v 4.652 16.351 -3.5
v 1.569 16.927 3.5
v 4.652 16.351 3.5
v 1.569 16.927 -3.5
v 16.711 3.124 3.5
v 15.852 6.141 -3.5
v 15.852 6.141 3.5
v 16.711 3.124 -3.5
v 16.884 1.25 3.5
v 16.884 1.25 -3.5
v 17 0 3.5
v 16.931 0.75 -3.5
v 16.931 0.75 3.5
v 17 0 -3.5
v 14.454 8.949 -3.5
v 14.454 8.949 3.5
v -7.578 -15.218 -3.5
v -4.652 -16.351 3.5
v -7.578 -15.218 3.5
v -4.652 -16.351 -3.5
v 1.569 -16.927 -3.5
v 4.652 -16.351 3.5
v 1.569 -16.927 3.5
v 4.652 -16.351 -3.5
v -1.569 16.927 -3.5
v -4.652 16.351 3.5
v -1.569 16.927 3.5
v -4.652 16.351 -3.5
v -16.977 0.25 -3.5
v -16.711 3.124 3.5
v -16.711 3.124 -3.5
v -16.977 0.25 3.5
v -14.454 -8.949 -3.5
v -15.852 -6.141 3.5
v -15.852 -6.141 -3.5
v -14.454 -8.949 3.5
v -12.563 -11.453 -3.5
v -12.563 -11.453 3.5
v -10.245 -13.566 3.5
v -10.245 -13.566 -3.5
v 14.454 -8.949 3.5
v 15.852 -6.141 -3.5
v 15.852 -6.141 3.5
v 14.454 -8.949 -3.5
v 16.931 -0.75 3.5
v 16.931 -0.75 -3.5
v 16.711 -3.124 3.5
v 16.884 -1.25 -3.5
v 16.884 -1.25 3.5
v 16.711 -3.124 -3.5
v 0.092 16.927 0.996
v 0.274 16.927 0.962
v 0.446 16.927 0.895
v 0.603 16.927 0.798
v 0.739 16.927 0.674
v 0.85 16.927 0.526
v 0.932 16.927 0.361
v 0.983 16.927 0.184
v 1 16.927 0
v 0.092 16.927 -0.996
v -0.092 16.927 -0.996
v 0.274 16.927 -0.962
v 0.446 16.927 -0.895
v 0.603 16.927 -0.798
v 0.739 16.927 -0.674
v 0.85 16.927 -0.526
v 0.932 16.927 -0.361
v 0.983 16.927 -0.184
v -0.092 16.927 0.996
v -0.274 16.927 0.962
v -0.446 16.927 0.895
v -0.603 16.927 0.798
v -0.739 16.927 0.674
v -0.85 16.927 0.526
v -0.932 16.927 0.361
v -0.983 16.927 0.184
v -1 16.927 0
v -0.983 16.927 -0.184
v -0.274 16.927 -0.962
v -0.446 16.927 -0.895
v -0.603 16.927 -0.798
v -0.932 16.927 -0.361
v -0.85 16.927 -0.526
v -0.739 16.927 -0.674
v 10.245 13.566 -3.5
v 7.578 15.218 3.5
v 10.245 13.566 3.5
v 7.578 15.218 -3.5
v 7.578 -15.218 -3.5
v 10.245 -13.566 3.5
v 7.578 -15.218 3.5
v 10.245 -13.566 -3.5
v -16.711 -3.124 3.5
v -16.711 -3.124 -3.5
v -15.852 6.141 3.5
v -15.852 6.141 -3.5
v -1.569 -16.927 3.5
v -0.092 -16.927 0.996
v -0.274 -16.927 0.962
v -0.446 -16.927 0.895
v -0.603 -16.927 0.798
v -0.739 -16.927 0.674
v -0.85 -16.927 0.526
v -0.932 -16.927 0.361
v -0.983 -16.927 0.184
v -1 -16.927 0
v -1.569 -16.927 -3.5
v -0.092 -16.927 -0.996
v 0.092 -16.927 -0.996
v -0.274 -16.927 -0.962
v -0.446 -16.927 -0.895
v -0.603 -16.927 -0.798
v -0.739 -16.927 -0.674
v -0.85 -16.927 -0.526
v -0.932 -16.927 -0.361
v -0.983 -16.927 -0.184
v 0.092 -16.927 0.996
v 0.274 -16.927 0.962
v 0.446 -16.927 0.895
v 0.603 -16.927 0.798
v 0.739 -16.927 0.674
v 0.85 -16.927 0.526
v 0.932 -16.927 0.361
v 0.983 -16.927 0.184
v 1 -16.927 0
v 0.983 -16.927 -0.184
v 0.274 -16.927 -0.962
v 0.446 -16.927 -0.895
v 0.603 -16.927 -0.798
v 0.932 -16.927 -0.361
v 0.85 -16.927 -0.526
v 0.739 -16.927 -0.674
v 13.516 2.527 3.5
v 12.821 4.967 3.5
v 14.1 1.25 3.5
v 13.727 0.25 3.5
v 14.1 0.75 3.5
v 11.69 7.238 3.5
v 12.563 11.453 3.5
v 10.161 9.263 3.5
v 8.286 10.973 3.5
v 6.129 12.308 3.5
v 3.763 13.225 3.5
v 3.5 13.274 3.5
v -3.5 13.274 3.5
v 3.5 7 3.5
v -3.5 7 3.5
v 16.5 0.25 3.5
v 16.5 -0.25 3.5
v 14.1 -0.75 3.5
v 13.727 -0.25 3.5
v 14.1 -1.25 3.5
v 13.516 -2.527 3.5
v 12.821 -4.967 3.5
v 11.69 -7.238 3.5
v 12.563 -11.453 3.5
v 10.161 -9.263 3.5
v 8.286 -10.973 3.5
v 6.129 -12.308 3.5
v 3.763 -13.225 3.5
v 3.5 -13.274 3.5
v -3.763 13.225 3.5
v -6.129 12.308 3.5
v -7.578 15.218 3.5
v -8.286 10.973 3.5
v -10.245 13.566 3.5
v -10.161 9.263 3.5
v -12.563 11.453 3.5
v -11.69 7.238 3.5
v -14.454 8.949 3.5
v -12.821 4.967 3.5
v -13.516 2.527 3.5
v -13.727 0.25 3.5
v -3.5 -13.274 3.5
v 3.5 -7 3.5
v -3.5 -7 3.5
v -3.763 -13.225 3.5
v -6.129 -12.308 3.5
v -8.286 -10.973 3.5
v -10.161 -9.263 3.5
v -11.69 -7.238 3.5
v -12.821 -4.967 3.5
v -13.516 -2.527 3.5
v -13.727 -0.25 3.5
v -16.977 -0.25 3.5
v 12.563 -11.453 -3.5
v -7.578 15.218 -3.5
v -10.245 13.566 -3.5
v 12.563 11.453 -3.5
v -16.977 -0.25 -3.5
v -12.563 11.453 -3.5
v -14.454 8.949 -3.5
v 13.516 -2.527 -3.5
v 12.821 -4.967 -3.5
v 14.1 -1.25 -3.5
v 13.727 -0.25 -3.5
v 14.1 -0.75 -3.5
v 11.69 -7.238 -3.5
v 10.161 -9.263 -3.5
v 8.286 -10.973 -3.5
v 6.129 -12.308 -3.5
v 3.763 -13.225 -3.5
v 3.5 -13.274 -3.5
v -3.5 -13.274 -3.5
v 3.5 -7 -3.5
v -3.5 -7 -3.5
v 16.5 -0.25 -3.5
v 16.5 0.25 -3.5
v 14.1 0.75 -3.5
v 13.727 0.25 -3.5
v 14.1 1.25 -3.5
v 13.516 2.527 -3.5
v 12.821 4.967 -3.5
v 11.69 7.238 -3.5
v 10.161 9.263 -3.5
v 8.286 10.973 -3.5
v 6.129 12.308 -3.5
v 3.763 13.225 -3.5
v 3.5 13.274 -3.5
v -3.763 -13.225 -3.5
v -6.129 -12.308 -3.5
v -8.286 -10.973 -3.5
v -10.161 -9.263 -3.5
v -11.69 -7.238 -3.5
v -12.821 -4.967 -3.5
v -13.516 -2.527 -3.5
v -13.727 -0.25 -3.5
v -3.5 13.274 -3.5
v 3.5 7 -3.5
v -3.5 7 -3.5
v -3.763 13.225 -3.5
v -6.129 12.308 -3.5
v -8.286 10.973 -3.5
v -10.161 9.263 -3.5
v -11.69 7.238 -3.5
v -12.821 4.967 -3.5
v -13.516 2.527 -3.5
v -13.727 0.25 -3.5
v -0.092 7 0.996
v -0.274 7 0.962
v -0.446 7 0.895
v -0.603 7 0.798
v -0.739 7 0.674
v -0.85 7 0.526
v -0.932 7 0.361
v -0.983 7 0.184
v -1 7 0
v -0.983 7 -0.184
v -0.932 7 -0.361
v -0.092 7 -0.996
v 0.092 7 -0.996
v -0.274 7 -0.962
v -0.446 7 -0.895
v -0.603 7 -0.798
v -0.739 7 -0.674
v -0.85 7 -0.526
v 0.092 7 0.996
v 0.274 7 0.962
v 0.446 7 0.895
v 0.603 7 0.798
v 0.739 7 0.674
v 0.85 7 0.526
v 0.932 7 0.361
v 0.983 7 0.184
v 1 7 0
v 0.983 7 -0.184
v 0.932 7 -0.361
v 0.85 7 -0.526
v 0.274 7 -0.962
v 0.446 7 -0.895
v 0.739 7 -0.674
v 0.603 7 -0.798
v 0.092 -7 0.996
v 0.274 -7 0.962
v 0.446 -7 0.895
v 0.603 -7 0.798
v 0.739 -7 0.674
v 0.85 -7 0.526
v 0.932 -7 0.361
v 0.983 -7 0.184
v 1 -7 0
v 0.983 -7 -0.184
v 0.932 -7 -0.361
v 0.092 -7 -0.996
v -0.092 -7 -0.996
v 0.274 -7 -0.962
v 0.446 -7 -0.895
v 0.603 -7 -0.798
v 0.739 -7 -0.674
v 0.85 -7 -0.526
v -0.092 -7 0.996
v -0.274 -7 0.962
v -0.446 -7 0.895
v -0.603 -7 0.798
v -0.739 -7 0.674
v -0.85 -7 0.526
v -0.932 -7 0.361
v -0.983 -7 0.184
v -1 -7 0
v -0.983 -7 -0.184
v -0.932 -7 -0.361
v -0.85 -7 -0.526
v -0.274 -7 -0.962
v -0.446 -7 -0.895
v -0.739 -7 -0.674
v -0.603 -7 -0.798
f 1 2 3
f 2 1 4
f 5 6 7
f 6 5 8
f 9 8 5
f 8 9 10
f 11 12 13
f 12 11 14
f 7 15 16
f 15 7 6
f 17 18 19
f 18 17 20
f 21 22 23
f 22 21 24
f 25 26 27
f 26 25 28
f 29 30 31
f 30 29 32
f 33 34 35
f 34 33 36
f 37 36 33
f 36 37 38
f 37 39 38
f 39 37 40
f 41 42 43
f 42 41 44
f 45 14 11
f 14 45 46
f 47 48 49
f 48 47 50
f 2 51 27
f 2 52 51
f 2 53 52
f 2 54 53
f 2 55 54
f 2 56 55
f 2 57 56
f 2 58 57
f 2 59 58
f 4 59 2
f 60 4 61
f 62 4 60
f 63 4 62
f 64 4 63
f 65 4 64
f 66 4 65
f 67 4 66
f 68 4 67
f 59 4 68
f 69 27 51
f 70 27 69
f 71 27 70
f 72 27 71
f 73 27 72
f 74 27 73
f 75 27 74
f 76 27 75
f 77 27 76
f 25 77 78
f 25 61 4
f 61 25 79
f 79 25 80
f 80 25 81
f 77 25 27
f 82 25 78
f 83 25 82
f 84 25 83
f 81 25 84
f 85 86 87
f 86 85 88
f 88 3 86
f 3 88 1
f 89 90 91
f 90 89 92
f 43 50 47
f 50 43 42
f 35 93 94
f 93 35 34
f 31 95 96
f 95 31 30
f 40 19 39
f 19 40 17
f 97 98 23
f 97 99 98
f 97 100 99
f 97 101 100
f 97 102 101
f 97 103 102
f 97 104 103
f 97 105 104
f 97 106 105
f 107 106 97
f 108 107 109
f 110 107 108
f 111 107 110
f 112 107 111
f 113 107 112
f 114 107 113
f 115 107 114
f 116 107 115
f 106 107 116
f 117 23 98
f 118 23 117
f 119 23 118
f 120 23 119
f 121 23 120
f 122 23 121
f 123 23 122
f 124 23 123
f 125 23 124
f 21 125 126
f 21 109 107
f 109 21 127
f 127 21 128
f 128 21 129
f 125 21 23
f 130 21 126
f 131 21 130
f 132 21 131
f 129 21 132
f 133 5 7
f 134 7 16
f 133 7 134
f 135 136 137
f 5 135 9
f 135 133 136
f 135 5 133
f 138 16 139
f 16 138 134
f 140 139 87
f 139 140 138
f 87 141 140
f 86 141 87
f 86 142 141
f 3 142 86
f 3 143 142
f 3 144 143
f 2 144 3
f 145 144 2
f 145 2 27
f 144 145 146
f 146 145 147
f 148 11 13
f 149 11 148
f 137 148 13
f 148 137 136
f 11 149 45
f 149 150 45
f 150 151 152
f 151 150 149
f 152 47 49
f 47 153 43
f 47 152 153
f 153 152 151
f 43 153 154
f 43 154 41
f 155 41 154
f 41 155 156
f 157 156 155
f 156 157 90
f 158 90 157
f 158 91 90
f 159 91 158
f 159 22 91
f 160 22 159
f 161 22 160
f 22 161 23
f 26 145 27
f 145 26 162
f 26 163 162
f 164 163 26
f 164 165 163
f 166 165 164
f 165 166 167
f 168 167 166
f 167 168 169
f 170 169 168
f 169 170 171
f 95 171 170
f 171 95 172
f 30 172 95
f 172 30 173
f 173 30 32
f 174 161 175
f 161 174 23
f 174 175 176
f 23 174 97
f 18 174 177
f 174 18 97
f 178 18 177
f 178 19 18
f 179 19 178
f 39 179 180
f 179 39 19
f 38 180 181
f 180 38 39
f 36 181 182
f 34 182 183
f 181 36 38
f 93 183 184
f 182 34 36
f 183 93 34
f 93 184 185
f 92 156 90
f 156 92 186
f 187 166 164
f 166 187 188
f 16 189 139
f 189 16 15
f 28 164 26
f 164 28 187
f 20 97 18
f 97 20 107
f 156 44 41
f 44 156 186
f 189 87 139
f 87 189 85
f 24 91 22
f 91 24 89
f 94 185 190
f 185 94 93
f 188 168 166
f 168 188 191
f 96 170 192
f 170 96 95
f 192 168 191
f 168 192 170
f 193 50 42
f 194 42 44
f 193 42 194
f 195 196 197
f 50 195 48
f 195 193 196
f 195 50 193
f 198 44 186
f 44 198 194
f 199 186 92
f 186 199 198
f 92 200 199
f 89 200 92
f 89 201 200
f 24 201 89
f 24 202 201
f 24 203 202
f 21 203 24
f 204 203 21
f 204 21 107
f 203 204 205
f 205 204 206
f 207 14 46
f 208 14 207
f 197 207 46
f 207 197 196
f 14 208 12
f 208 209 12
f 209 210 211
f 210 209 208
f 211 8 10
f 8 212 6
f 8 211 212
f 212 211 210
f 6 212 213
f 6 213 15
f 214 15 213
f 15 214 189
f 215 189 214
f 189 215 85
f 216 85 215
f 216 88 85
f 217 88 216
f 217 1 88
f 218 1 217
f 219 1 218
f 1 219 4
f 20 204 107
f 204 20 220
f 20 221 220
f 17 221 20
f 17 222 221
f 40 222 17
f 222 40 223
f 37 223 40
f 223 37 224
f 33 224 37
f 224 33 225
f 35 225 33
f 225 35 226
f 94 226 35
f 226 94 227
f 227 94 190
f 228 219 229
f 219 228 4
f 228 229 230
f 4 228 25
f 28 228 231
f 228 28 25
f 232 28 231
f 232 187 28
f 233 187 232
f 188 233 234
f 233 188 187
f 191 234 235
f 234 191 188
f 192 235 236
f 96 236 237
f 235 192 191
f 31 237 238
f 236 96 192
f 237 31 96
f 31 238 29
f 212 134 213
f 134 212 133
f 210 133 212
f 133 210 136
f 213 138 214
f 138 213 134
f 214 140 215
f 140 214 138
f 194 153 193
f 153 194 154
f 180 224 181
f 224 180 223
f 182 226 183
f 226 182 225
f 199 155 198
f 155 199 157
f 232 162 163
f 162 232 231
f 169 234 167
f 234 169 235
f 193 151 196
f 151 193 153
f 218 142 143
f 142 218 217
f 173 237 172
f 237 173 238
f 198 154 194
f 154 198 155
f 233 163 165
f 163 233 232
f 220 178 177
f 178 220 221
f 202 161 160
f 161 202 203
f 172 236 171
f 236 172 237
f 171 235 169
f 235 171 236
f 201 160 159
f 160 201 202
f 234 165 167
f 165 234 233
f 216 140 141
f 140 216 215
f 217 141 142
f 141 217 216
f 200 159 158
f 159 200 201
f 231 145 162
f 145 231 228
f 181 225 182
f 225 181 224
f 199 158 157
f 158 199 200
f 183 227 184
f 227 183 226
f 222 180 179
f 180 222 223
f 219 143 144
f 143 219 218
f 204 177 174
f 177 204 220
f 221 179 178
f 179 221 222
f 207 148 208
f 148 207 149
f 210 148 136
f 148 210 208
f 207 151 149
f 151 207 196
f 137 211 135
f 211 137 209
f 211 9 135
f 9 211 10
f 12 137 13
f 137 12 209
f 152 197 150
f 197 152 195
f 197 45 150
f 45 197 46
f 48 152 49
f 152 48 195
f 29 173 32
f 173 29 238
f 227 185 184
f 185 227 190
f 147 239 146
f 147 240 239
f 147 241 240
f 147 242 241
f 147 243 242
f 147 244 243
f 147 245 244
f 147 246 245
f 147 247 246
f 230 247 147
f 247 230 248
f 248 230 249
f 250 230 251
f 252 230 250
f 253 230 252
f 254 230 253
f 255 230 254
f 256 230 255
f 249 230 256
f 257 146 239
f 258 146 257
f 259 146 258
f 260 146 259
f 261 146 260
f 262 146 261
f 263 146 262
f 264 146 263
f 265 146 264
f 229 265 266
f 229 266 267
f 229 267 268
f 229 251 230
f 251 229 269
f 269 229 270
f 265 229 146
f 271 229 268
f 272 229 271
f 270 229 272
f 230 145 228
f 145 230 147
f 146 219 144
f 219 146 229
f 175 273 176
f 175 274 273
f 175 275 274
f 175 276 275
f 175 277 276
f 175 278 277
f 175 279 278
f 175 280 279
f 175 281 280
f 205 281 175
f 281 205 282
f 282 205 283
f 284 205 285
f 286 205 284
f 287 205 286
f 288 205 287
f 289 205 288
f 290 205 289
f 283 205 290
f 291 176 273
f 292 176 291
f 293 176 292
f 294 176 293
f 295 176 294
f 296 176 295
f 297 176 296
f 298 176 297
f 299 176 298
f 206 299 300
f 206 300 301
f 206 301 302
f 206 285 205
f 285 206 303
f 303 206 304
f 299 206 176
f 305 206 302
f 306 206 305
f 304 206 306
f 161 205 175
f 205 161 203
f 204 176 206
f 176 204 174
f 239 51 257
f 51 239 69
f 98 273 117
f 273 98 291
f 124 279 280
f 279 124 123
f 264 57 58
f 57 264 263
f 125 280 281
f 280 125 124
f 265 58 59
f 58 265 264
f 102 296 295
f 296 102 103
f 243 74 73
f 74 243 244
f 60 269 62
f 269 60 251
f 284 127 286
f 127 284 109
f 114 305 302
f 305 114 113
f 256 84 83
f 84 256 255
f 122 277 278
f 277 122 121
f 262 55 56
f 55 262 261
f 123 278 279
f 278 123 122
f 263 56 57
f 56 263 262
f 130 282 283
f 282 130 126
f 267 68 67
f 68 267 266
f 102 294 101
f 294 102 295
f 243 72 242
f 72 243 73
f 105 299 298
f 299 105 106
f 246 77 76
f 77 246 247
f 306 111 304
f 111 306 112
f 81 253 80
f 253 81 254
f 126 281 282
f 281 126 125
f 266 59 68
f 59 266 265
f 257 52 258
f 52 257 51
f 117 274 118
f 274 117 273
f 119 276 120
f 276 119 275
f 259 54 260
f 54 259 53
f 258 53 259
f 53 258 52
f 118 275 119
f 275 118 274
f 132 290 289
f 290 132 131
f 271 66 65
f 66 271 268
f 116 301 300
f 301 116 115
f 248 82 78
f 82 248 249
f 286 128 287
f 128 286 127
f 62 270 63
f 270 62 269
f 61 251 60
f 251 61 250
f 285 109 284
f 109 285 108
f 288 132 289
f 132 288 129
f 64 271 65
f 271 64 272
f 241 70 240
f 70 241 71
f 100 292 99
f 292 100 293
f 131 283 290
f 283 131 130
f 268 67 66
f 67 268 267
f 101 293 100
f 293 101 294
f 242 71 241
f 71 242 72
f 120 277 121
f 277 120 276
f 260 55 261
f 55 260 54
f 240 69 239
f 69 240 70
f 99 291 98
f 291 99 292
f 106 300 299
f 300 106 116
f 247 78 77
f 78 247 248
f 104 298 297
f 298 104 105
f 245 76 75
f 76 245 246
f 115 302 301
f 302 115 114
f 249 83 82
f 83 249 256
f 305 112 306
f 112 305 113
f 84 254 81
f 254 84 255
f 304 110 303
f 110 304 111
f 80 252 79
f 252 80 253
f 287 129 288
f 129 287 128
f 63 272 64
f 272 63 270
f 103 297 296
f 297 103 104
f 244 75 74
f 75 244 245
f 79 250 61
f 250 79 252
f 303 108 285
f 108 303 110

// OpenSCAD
$fn=34;
difference()
{
    union()
    {
        difference()
        { 
            cylinder(d=34, h=7, center=true);    
            cylinder(d=27.5, h=80, center=true);
            
            translate([13,0,0])
                cube([7,0.5,8], center=true);
            translate([15.6,1,0])
                cube([3,0.5,8], center=true);
            translate([15.6,-1,0])
                cube([3,0.5,8], center=true);
            translate([-15.6,0,0])
                cube([6,0.5,8], center=true);
            
        }

        for(i=[90:180:360])
        {    
            rotate([0,0,i])
            translate([10.5,0,0])
            cube([7,7,7], center=true);
        }
    }

    rotate([90,0])
        cylinder(h=80,d=2, center=true);
}
